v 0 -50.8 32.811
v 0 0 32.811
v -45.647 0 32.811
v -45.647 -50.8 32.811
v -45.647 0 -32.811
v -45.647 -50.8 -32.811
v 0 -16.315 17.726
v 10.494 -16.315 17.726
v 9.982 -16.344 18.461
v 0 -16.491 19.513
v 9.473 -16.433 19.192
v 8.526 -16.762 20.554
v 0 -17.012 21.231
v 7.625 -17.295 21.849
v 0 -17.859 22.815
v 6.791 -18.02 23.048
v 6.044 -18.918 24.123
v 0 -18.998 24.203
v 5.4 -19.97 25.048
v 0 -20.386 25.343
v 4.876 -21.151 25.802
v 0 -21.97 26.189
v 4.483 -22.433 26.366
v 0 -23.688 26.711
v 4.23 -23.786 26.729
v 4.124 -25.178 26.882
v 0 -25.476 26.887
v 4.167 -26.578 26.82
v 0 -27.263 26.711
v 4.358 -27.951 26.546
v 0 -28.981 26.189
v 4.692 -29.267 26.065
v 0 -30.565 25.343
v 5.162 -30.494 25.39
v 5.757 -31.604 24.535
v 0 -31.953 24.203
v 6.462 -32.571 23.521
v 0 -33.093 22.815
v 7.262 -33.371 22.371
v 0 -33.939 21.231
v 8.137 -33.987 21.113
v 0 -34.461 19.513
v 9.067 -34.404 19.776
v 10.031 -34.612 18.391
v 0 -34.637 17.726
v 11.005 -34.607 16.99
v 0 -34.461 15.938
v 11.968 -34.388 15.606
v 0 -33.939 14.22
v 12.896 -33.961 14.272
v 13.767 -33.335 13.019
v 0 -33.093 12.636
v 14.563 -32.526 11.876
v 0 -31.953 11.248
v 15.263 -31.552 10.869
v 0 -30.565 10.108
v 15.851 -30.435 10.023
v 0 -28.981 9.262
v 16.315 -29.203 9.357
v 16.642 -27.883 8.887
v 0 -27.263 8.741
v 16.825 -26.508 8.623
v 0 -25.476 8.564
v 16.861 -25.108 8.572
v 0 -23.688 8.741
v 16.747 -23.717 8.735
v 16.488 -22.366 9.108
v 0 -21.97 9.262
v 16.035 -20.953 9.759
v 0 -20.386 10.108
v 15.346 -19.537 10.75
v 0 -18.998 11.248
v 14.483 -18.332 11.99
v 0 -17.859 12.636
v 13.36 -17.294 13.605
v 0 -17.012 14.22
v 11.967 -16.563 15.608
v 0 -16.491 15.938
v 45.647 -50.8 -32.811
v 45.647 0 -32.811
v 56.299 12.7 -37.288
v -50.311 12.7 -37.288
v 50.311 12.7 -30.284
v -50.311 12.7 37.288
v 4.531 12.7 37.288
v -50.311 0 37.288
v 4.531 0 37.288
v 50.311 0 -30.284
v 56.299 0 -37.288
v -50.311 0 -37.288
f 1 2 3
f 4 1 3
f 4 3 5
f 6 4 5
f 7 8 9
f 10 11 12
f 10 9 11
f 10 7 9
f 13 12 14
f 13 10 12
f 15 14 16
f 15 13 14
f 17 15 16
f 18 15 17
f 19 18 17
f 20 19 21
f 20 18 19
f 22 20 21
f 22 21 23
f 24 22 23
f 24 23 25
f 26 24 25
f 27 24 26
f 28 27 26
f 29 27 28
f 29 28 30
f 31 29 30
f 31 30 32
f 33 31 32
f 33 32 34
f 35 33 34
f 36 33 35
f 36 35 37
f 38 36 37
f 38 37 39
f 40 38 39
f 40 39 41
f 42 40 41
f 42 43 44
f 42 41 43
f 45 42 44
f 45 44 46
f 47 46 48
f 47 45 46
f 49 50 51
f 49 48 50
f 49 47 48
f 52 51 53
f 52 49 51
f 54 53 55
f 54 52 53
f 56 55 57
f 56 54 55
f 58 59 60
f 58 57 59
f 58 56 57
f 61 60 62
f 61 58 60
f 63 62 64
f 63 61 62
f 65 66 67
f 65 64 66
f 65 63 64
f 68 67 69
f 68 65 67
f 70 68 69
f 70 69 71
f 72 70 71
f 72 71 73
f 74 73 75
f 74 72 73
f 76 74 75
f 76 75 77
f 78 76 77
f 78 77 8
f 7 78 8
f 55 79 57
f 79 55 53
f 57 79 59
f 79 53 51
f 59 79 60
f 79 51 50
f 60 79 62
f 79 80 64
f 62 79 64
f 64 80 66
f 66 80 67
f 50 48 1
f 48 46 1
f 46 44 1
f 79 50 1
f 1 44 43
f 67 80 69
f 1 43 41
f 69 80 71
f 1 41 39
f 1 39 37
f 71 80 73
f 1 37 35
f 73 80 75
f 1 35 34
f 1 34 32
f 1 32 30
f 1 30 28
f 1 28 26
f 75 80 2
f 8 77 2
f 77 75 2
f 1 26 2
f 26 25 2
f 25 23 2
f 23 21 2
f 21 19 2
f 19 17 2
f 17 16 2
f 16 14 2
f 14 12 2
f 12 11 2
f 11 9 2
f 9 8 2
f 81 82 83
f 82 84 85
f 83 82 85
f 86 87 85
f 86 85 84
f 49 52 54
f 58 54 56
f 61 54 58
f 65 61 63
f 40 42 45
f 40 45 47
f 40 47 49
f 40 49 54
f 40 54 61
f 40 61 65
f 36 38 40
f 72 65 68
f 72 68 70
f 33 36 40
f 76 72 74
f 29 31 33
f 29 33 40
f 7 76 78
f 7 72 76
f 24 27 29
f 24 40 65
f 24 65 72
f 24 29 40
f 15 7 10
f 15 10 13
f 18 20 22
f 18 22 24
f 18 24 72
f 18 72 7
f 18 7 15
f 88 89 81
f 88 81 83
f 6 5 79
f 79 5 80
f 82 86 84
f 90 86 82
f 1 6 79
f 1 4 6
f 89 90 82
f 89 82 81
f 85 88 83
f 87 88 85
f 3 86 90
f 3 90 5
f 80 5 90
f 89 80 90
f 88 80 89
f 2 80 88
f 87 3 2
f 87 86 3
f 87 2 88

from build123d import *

# Parameters (mm, degrees)
F2_DEPTH = 50.8
F3_DEPTH = 12.7
F4_R     = 9.161038
F5_DEPTH = 50.8


with BuildPart() as f2:
    # F0 (on Front) → F2 (new body)
    with BuildSketch(Plane.XZ):
        Polygon((-45.646802, -32.811075), (45.646802, -32.811075), (0, 32.811075), (-45.646802, 32.811075), align=None)
    extrude(amount=F2_DEPTH)

    # F1 (on Front) → F3 (join)
    with BuildSketch(Plane.XZ):
        Polygon((4.530817, 37.287548), (-50.311431, 37.287548), (-50.311431, -37.287548), (50.311431, -37.287548), (56.298688, -37.287548), (50.311431, -30.283526), align=None)
    extrude(amount=-F3_DEPTH)

    # F4 (on Right) → F5 (cut)
    with BuildSketch(Plane.YZ):
        with Locations((-25.475649, 17.725538)):
            Circle(F4_R)
    extrude(amount=F5_DEPTH, mode=Mode.SUBTRACT)


solid = f2.part
